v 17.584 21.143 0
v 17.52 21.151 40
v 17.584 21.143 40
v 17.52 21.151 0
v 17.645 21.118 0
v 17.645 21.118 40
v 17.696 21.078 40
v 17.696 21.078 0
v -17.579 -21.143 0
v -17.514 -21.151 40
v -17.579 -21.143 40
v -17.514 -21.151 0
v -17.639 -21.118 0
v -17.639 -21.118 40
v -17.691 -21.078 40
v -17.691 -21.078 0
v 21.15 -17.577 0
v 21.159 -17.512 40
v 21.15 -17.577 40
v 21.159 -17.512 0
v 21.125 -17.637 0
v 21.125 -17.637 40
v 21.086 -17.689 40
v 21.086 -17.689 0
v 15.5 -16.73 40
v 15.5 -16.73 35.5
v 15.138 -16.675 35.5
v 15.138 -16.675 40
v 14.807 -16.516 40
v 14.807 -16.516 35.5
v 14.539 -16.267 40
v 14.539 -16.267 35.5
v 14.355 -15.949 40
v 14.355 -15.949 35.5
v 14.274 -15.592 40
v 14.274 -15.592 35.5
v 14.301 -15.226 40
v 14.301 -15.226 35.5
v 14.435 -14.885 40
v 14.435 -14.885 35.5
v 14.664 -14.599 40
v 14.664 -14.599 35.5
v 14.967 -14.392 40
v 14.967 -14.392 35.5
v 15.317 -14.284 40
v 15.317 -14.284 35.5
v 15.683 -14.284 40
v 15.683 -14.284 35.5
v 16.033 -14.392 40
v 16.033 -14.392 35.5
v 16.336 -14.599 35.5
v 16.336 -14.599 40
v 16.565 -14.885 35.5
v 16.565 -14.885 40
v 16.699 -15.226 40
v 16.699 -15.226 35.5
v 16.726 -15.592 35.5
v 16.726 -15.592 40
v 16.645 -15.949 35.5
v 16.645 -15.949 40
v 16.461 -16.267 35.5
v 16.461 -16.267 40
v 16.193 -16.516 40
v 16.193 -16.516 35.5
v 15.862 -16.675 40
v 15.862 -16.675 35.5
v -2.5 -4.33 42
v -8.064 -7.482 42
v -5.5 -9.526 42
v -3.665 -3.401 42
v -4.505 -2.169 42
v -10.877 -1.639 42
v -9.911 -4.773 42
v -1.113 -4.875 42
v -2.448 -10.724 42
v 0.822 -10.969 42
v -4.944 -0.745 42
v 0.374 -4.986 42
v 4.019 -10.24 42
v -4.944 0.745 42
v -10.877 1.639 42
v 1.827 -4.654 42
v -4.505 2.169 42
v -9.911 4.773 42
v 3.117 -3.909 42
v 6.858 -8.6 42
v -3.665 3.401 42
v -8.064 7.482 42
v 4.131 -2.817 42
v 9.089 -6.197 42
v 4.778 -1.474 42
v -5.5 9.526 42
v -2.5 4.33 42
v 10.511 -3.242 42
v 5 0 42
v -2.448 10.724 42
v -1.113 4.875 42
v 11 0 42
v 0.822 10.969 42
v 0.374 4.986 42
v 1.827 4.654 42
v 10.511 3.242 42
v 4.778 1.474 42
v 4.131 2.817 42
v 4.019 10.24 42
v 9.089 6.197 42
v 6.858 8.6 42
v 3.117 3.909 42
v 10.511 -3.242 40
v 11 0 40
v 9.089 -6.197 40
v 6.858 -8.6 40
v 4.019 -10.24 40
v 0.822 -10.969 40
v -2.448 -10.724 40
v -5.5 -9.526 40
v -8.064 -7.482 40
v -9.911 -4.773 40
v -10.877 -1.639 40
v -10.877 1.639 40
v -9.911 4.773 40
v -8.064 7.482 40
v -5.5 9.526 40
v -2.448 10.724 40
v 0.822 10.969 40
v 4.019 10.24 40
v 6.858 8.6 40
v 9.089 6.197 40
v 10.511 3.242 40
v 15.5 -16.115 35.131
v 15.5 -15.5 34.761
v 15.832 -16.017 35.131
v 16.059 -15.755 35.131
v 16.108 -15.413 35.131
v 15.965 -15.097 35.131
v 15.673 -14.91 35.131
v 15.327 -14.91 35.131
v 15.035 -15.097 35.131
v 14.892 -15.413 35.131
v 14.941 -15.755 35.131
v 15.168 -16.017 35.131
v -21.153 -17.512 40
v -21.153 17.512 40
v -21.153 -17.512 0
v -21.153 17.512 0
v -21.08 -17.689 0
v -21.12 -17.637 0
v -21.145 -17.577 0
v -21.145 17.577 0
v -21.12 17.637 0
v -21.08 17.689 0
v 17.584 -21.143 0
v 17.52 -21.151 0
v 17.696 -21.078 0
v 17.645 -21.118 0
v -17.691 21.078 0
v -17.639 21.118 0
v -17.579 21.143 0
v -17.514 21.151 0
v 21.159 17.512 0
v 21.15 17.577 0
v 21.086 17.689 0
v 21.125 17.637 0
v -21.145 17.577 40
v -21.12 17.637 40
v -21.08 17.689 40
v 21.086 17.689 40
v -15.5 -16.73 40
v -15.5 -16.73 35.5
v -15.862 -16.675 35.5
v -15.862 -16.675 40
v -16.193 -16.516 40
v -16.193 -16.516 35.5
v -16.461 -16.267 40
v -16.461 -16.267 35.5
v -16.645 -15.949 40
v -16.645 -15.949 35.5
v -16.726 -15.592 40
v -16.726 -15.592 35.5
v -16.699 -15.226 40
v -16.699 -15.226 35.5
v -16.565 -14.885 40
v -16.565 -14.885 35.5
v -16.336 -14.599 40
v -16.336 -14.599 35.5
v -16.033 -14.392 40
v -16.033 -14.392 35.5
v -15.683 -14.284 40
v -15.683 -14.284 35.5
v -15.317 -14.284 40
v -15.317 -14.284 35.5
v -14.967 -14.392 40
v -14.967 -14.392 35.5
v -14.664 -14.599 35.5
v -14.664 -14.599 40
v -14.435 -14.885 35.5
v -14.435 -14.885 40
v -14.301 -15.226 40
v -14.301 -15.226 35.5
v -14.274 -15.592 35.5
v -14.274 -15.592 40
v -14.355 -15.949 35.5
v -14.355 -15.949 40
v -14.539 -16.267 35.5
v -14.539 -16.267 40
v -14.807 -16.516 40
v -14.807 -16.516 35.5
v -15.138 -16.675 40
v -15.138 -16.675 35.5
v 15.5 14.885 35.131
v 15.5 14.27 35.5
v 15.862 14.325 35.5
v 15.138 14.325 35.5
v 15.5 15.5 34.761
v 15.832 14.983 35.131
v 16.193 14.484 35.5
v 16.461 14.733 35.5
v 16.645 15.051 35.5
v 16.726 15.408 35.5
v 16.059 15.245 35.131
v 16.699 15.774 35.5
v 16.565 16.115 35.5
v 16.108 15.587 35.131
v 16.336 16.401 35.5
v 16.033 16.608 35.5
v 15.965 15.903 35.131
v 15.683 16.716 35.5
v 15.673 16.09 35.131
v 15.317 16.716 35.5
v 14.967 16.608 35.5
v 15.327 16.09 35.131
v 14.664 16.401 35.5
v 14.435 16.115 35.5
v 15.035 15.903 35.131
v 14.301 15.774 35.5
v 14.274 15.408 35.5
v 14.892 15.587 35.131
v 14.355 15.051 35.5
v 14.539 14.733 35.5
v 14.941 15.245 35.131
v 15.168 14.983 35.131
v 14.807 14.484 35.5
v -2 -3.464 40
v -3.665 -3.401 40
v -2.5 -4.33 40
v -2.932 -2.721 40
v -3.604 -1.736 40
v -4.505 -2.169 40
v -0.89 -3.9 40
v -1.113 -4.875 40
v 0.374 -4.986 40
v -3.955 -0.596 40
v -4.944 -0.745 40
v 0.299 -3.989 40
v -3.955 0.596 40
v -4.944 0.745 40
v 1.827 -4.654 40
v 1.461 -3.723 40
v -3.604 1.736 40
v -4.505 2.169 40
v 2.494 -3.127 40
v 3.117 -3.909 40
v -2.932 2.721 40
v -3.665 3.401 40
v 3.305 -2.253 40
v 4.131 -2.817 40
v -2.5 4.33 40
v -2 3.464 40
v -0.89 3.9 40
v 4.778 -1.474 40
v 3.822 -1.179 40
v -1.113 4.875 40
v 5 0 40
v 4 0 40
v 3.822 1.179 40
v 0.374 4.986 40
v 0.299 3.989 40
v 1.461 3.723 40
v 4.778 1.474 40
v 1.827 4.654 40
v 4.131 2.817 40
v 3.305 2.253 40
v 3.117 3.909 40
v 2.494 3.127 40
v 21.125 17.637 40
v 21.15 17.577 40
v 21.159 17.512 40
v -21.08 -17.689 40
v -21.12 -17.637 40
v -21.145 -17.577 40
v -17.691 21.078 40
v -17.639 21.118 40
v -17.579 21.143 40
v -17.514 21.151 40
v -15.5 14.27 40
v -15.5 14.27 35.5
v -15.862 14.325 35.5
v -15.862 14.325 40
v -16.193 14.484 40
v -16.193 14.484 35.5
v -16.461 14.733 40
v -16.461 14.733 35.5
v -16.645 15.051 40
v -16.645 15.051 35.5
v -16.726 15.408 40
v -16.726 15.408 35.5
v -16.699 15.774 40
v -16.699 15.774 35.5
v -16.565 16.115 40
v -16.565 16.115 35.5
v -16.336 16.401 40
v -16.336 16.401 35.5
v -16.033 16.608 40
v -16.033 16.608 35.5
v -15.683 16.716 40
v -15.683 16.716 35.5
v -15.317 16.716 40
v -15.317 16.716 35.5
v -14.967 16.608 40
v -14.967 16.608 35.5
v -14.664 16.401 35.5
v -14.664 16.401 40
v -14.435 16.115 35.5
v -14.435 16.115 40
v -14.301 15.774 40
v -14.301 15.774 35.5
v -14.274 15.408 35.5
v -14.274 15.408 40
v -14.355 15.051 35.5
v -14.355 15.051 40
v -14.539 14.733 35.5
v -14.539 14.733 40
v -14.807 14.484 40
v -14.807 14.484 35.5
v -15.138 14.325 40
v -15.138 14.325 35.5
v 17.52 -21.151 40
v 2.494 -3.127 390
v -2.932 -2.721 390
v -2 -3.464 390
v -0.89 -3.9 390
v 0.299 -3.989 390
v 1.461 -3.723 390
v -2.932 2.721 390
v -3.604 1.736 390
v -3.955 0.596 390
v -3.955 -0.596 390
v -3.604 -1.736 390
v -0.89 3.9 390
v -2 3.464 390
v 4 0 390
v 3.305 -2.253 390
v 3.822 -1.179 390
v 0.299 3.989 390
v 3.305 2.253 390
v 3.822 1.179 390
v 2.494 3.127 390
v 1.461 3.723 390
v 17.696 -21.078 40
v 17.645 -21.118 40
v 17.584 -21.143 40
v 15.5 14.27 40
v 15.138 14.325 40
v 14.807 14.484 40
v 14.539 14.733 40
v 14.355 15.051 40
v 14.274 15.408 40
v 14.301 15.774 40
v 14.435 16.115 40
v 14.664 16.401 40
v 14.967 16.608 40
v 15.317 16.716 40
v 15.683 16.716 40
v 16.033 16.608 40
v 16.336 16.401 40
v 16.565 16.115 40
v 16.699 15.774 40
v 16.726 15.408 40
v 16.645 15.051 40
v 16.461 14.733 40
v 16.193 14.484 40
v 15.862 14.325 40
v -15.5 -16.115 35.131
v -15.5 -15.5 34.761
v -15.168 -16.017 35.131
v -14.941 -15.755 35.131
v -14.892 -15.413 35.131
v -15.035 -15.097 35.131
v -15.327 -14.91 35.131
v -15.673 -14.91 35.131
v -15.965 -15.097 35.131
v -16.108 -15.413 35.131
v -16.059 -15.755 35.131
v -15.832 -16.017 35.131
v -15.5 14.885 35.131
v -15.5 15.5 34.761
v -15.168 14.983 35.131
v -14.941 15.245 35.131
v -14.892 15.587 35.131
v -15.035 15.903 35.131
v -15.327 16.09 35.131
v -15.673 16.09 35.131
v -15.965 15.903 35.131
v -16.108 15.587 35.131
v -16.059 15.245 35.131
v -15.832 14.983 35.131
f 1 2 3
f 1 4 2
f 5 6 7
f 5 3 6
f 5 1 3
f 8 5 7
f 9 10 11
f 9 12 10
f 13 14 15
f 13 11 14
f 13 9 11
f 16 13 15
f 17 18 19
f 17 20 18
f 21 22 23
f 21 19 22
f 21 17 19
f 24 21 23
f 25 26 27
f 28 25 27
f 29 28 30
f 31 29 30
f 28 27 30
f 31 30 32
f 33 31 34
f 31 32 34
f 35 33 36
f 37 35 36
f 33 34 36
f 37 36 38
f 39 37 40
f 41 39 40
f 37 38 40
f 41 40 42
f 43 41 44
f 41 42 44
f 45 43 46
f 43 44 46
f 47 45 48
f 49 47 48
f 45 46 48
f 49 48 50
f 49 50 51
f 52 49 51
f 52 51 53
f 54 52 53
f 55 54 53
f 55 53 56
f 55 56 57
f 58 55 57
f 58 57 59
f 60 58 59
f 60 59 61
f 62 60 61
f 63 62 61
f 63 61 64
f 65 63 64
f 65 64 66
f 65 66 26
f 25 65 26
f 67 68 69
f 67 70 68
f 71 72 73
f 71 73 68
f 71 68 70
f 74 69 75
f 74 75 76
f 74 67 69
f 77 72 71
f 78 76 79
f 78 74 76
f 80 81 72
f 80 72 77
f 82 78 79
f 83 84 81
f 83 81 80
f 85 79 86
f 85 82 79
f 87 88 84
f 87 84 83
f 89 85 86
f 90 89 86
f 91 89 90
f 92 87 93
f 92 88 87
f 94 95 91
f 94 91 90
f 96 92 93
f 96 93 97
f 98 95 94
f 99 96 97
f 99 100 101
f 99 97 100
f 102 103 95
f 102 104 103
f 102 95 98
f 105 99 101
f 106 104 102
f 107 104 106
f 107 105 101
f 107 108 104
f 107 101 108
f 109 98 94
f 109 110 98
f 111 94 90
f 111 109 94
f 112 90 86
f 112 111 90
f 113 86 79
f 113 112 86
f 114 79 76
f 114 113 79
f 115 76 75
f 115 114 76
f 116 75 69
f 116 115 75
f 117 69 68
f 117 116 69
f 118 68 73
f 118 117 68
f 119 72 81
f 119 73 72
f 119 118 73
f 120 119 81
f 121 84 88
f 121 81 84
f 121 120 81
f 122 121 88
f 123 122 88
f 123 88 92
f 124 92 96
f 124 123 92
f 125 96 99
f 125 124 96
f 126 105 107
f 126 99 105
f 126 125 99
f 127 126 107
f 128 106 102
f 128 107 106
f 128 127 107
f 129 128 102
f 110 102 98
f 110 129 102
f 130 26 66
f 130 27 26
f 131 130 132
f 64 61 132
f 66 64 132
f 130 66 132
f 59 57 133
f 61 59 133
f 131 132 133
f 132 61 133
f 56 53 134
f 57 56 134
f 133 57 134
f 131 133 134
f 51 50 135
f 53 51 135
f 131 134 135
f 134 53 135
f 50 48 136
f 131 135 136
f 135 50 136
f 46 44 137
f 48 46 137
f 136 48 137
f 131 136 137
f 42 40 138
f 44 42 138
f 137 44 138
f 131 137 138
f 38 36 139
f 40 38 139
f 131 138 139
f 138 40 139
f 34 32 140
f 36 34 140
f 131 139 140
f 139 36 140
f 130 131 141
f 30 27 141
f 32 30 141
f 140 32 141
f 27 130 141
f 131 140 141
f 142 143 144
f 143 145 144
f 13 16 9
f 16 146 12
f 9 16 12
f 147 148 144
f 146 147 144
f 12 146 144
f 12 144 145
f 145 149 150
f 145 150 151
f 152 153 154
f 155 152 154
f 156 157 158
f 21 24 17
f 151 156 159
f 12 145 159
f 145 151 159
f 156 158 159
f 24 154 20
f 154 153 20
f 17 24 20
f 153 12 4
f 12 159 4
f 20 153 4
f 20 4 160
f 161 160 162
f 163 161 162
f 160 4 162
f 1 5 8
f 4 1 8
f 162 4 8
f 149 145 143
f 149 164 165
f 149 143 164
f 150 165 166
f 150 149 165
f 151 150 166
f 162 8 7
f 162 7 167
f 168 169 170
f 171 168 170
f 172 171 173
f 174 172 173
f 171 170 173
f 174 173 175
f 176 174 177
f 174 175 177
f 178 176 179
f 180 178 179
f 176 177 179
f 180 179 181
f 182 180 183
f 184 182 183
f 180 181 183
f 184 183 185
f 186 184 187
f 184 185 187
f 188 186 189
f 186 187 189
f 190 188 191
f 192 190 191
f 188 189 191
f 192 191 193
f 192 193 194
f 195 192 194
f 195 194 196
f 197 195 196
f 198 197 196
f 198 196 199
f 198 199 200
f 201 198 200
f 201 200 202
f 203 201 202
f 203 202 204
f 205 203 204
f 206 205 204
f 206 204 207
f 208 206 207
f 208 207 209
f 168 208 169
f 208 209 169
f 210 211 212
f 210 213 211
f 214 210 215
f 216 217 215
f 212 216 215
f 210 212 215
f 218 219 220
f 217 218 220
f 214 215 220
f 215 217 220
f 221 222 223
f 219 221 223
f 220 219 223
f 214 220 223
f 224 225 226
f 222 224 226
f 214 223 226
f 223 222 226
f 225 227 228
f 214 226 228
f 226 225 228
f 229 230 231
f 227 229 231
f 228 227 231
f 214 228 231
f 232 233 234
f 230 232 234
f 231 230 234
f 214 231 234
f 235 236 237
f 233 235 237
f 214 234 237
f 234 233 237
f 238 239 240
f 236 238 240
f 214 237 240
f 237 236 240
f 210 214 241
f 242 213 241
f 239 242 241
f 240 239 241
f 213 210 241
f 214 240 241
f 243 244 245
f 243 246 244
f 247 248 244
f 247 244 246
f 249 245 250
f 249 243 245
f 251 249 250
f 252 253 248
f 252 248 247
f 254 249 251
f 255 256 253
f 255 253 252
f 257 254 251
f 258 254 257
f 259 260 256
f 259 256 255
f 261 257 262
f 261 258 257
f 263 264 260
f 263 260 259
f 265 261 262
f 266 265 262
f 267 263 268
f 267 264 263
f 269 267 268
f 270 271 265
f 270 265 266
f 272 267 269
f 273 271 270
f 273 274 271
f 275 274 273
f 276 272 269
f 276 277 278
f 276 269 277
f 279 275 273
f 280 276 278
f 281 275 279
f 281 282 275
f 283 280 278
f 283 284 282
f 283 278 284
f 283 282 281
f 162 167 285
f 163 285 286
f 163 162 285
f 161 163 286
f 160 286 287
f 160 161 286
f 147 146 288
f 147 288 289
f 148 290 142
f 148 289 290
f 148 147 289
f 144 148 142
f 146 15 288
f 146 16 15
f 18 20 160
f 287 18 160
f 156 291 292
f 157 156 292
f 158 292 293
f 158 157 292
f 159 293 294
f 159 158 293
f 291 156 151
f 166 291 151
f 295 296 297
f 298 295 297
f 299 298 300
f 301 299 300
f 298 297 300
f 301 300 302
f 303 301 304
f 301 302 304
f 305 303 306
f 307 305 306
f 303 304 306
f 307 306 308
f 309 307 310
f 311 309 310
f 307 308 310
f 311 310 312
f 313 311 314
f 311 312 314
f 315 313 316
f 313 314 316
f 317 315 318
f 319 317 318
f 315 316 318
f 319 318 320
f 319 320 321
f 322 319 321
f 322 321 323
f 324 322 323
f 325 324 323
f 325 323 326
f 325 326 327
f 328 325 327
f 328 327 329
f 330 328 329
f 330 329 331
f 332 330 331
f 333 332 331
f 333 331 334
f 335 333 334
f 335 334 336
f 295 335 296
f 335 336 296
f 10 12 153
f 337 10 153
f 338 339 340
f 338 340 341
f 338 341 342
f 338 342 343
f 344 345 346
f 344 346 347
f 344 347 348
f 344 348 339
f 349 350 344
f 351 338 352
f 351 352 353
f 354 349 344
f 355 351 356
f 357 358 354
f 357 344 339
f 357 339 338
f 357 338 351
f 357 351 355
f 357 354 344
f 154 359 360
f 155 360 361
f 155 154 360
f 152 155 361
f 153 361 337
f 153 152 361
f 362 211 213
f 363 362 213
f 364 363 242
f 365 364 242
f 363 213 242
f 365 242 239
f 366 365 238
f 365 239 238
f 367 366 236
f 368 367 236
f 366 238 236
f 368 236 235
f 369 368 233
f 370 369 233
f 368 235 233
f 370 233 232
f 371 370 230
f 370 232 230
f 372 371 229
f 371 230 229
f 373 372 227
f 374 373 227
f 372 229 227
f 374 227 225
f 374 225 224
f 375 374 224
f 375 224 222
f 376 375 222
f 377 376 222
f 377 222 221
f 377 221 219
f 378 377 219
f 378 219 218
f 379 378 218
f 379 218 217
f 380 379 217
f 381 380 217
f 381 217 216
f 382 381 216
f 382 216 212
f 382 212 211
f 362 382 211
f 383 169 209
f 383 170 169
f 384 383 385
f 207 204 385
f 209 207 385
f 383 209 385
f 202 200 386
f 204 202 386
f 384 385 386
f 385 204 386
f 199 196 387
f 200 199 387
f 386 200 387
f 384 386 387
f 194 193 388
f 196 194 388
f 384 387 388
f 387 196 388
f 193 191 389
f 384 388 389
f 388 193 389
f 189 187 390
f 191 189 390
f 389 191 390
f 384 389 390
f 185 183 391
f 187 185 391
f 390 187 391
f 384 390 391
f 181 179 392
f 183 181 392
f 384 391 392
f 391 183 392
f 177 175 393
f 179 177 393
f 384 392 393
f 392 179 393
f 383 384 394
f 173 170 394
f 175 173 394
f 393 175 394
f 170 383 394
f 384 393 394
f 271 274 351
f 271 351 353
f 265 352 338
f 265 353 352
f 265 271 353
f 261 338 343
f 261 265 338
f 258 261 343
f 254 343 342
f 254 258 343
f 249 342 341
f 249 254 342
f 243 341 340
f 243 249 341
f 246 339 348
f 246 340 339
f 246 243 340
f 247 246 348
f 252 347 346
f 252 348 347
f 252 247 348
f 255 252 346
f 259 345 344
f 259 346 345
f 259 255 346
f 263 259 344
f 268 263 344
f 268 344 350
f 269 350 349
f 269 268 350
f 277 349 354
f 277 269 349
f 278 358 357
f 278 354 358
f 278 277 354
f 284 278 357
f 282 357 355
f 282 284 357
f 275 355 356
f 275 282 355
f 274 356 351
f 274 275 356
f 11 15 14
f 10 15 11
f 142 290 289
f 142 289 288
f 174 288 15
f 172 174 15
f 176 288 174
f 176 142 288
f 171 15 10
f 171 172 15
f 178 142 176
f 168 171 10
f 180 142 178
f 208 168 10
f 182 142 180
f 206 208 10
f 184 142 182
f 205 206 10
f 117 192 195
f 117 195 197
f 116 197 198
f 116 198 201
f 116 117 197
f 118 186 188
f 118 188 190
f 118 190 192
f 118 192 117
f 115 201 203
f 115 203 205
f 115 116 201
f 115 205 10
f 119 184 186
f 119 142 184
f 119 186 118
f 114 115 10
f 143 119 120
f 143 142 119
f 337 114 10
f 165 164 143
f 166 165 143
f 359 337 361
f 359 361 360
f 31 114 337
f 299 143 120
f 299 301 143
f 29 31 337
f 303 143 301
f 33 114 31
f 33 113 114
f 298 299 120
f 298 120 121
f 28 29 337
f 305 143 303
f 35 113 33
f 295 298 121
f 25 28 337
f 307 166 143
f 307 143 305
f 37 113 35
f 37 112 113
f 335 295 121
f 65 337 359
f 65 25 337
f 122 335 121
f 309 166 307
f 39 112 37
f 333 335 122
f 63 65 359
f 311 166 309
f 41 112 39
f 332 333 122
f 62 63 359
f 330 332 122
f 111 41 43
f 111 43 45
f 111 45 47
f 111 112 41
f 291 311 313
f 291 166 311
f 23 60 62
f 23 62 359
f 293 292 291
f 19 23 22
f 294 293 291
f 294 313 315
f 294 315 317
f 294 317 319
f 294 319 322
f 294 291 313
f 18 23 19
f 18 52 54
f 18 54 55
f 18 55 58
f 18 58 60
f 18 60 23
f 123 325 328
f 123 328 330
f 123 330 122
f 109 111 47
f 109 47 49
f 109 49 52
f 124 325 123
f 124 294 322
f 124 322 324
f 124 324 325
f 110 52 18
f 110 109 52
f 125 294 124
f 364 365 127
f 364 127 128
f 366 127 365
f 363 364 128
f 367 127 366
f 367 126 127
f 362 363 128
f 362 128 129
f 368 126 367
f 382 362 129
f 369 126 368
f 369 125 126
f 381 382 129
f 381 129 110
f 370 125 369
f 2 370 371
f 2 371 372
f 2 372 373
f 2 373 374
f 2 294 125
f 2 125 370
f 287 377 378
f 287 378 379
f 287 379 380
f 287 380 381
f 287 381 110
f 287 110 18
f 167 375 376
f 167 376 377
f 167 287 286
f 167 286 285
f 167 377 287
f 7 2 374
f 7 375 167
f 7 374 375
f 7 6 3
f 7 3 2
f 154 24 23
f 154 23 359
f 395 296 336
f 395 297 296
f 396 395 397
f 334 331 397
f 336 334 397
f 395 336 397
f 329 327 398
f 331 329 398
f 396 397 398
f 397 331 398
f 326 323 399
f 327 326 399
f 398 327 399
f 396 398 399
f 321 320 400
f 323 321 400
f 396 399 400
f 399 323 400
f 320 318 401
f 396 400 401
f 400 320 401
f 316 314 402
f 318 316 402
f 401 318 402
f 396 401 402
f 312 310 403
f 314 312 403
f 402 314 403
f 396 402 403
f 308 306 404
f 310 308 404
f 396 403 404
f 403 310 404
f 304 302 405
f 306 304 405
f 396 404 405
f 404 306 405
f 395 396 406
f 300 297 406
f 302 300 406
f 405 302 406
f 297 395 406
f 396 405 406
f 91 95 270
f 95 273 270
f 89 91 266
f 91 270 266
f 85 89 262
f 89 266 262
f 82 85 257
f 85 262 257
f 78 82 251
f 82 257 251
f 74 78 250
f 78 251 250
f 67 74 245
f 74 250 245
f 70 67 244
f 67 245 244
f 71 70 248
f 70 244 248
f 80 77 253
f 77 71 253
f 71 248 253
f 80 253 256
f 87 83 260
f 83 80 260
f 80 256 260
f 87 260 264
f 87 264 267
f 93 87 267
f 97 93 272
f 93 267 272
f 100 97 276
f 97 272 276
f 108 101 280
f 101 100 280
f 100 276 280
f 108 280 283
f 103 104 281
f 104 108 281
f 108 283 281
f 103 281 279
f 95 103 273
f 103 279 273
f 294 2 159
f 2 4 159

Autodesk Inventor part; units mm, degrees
ref_plane "YZ Plane" through (0, 0, 0) normal (1, 0, 0) x (0, 1, 0)
ref_plane "XZ Plane" through (0, 0, 0) normal (0, 1, 0) x (-1, 0, 0)
ref_plane "XY Plane" through (0, 0, 0) normal (0, 0, 1) x (1, 0, 0)
sketch "Sketch1" plane through (0, 0, 0) normal (0, 0, 1) x (1, 0, 0)
  line L0 (17.5196, 21.1512) -> (-17.5142, 21.1512)
  line L1 (-21.1533, 17.5121) -> (-21.1533, -17.5122)
  line L2 (-17.5142, -21.1513) -> (17.5196, -21.1513)
  line L3 (21.1587, -17.5122) -> (21.1587, 17.5121)
  line L4 (21.1533, 21.1533) -> (-21.1467, -21.1467) construction
  line L5 (-21.1598, 21.1533) -> (21.1533, -21.1467) construction
  line L6 (-17.691, 21.078) -> (-21.08, 17.6889)
  line L7 (17.6964, 21.078) -> (21.0855, 17.6889)
  line L8 (21.0855, -17.689) -> (17.6964, -21.0781)
  line L9 (-17.691, -21.0781) -> (-21.08, -17.689)
  arc A0 (-17.5142, 21.1512) -> (-17.691, 21.078) centre (-17.5142, 20.9012) ccw
  arc A1 (-21.08, 17.6889) -> (-21.1533, 17.5121) centre (-20.9033, 17.5121) ccw
  arc A2 (17.6964, 21.078) -> (17.5196, 21.1512) centre (17.5196, 20.9012) ccw
  arc A3 (21.1587, 17.5121) -> (21.0855, 17.6889) centre (20.9087, 17.5121) ccw
  arc A4 (21.0855, -17.689) -> (21.1587, -17.5122) centre (20.9087, -17.5122) ccw
  arc A5 (17.5196, -21.1513) -> (17.6964, -21.0781) centre (17.5196, -20.9013) ccw
  arc A6 (-17.691, -21.0781) -> (-17.5142, -21.1513) centre (-17.5142, -20.9013) ccw
  arc A7 (-21.1533, -17.5122) -> (-21.08, -17.689) centre (-20.9033, -17.5122) ccw
  point P0 (0, 0)
  point P1 (-17.6177, 21.1512)
  point P2 (-21.1533, 17.6156)
  dimension "d0" = 42.3
  dimension "d1" = 42.3
  dimension "d2" = 5
  dimension "d3" = 45
  dimension "d4" = 0.25
extrude "Extrusion1" add sketch "Sketch1" along normal blind 40
sketch "Sketch2" plane through (0, 0, 40) normal (0, 0, 1) x (1, 0, 0)
  circle A0 centre (0, 0) radius 11
  circle A1 centre (0, 0) radius 5
  dimension "d7" = 22
  dimension "d8" = 10
extrude "Extrusion2" add sketch "Sketch2" along normal blind 2
sketch "Sketch3" plane through (0, 0, 40) normal (0, 0, 1) x (1, 0, 0)
  circle A0 centre (0, 0) radius 11 projected
  line L0 (-15.5, -15.5) -> (15.5, -15.5) construction
  line L1 (15.5, -15.5) -> (15.5, 15.5) construction
  line L2 (15.5, 15.5) -> (-15.5, 15.5) construction
  line L3 (-15.5, 15.5) -> (-15.5, -15.5) construction
  line L4 (-15.5, -15.5) -> (15.5, 15.5) construction
  line L5 (15.5, -15.5) -> (-15.5, 15.5) construction
  dimension "d11" = 31
  dimension "d12" = 31
hole "Hole1" at (-15.5, 15.5, 40) at (15.5, 15.5, 40) at (15.5, -15.5, 40) at (-15.5, -15.5, 40) direction (0, 0, -1) diameter 2.459 depth 4.5 tip angle 118 thread size "M3x0.5" class "6H" standard "ANSI Metric M Profile"
sketch "Sketch4" plane through (0, 0, 40) normal (0, 0, 1) x (1, 0, 0)
  circle A0 centre (0, 0) radius 5 projected
  circle A1 centre (0, 0) radius 4
  dimension "d20" = 8
extrude "Extrusion3" add sketch "Sketch4" along normal blind 350 contours A1
properties part number "motor"
